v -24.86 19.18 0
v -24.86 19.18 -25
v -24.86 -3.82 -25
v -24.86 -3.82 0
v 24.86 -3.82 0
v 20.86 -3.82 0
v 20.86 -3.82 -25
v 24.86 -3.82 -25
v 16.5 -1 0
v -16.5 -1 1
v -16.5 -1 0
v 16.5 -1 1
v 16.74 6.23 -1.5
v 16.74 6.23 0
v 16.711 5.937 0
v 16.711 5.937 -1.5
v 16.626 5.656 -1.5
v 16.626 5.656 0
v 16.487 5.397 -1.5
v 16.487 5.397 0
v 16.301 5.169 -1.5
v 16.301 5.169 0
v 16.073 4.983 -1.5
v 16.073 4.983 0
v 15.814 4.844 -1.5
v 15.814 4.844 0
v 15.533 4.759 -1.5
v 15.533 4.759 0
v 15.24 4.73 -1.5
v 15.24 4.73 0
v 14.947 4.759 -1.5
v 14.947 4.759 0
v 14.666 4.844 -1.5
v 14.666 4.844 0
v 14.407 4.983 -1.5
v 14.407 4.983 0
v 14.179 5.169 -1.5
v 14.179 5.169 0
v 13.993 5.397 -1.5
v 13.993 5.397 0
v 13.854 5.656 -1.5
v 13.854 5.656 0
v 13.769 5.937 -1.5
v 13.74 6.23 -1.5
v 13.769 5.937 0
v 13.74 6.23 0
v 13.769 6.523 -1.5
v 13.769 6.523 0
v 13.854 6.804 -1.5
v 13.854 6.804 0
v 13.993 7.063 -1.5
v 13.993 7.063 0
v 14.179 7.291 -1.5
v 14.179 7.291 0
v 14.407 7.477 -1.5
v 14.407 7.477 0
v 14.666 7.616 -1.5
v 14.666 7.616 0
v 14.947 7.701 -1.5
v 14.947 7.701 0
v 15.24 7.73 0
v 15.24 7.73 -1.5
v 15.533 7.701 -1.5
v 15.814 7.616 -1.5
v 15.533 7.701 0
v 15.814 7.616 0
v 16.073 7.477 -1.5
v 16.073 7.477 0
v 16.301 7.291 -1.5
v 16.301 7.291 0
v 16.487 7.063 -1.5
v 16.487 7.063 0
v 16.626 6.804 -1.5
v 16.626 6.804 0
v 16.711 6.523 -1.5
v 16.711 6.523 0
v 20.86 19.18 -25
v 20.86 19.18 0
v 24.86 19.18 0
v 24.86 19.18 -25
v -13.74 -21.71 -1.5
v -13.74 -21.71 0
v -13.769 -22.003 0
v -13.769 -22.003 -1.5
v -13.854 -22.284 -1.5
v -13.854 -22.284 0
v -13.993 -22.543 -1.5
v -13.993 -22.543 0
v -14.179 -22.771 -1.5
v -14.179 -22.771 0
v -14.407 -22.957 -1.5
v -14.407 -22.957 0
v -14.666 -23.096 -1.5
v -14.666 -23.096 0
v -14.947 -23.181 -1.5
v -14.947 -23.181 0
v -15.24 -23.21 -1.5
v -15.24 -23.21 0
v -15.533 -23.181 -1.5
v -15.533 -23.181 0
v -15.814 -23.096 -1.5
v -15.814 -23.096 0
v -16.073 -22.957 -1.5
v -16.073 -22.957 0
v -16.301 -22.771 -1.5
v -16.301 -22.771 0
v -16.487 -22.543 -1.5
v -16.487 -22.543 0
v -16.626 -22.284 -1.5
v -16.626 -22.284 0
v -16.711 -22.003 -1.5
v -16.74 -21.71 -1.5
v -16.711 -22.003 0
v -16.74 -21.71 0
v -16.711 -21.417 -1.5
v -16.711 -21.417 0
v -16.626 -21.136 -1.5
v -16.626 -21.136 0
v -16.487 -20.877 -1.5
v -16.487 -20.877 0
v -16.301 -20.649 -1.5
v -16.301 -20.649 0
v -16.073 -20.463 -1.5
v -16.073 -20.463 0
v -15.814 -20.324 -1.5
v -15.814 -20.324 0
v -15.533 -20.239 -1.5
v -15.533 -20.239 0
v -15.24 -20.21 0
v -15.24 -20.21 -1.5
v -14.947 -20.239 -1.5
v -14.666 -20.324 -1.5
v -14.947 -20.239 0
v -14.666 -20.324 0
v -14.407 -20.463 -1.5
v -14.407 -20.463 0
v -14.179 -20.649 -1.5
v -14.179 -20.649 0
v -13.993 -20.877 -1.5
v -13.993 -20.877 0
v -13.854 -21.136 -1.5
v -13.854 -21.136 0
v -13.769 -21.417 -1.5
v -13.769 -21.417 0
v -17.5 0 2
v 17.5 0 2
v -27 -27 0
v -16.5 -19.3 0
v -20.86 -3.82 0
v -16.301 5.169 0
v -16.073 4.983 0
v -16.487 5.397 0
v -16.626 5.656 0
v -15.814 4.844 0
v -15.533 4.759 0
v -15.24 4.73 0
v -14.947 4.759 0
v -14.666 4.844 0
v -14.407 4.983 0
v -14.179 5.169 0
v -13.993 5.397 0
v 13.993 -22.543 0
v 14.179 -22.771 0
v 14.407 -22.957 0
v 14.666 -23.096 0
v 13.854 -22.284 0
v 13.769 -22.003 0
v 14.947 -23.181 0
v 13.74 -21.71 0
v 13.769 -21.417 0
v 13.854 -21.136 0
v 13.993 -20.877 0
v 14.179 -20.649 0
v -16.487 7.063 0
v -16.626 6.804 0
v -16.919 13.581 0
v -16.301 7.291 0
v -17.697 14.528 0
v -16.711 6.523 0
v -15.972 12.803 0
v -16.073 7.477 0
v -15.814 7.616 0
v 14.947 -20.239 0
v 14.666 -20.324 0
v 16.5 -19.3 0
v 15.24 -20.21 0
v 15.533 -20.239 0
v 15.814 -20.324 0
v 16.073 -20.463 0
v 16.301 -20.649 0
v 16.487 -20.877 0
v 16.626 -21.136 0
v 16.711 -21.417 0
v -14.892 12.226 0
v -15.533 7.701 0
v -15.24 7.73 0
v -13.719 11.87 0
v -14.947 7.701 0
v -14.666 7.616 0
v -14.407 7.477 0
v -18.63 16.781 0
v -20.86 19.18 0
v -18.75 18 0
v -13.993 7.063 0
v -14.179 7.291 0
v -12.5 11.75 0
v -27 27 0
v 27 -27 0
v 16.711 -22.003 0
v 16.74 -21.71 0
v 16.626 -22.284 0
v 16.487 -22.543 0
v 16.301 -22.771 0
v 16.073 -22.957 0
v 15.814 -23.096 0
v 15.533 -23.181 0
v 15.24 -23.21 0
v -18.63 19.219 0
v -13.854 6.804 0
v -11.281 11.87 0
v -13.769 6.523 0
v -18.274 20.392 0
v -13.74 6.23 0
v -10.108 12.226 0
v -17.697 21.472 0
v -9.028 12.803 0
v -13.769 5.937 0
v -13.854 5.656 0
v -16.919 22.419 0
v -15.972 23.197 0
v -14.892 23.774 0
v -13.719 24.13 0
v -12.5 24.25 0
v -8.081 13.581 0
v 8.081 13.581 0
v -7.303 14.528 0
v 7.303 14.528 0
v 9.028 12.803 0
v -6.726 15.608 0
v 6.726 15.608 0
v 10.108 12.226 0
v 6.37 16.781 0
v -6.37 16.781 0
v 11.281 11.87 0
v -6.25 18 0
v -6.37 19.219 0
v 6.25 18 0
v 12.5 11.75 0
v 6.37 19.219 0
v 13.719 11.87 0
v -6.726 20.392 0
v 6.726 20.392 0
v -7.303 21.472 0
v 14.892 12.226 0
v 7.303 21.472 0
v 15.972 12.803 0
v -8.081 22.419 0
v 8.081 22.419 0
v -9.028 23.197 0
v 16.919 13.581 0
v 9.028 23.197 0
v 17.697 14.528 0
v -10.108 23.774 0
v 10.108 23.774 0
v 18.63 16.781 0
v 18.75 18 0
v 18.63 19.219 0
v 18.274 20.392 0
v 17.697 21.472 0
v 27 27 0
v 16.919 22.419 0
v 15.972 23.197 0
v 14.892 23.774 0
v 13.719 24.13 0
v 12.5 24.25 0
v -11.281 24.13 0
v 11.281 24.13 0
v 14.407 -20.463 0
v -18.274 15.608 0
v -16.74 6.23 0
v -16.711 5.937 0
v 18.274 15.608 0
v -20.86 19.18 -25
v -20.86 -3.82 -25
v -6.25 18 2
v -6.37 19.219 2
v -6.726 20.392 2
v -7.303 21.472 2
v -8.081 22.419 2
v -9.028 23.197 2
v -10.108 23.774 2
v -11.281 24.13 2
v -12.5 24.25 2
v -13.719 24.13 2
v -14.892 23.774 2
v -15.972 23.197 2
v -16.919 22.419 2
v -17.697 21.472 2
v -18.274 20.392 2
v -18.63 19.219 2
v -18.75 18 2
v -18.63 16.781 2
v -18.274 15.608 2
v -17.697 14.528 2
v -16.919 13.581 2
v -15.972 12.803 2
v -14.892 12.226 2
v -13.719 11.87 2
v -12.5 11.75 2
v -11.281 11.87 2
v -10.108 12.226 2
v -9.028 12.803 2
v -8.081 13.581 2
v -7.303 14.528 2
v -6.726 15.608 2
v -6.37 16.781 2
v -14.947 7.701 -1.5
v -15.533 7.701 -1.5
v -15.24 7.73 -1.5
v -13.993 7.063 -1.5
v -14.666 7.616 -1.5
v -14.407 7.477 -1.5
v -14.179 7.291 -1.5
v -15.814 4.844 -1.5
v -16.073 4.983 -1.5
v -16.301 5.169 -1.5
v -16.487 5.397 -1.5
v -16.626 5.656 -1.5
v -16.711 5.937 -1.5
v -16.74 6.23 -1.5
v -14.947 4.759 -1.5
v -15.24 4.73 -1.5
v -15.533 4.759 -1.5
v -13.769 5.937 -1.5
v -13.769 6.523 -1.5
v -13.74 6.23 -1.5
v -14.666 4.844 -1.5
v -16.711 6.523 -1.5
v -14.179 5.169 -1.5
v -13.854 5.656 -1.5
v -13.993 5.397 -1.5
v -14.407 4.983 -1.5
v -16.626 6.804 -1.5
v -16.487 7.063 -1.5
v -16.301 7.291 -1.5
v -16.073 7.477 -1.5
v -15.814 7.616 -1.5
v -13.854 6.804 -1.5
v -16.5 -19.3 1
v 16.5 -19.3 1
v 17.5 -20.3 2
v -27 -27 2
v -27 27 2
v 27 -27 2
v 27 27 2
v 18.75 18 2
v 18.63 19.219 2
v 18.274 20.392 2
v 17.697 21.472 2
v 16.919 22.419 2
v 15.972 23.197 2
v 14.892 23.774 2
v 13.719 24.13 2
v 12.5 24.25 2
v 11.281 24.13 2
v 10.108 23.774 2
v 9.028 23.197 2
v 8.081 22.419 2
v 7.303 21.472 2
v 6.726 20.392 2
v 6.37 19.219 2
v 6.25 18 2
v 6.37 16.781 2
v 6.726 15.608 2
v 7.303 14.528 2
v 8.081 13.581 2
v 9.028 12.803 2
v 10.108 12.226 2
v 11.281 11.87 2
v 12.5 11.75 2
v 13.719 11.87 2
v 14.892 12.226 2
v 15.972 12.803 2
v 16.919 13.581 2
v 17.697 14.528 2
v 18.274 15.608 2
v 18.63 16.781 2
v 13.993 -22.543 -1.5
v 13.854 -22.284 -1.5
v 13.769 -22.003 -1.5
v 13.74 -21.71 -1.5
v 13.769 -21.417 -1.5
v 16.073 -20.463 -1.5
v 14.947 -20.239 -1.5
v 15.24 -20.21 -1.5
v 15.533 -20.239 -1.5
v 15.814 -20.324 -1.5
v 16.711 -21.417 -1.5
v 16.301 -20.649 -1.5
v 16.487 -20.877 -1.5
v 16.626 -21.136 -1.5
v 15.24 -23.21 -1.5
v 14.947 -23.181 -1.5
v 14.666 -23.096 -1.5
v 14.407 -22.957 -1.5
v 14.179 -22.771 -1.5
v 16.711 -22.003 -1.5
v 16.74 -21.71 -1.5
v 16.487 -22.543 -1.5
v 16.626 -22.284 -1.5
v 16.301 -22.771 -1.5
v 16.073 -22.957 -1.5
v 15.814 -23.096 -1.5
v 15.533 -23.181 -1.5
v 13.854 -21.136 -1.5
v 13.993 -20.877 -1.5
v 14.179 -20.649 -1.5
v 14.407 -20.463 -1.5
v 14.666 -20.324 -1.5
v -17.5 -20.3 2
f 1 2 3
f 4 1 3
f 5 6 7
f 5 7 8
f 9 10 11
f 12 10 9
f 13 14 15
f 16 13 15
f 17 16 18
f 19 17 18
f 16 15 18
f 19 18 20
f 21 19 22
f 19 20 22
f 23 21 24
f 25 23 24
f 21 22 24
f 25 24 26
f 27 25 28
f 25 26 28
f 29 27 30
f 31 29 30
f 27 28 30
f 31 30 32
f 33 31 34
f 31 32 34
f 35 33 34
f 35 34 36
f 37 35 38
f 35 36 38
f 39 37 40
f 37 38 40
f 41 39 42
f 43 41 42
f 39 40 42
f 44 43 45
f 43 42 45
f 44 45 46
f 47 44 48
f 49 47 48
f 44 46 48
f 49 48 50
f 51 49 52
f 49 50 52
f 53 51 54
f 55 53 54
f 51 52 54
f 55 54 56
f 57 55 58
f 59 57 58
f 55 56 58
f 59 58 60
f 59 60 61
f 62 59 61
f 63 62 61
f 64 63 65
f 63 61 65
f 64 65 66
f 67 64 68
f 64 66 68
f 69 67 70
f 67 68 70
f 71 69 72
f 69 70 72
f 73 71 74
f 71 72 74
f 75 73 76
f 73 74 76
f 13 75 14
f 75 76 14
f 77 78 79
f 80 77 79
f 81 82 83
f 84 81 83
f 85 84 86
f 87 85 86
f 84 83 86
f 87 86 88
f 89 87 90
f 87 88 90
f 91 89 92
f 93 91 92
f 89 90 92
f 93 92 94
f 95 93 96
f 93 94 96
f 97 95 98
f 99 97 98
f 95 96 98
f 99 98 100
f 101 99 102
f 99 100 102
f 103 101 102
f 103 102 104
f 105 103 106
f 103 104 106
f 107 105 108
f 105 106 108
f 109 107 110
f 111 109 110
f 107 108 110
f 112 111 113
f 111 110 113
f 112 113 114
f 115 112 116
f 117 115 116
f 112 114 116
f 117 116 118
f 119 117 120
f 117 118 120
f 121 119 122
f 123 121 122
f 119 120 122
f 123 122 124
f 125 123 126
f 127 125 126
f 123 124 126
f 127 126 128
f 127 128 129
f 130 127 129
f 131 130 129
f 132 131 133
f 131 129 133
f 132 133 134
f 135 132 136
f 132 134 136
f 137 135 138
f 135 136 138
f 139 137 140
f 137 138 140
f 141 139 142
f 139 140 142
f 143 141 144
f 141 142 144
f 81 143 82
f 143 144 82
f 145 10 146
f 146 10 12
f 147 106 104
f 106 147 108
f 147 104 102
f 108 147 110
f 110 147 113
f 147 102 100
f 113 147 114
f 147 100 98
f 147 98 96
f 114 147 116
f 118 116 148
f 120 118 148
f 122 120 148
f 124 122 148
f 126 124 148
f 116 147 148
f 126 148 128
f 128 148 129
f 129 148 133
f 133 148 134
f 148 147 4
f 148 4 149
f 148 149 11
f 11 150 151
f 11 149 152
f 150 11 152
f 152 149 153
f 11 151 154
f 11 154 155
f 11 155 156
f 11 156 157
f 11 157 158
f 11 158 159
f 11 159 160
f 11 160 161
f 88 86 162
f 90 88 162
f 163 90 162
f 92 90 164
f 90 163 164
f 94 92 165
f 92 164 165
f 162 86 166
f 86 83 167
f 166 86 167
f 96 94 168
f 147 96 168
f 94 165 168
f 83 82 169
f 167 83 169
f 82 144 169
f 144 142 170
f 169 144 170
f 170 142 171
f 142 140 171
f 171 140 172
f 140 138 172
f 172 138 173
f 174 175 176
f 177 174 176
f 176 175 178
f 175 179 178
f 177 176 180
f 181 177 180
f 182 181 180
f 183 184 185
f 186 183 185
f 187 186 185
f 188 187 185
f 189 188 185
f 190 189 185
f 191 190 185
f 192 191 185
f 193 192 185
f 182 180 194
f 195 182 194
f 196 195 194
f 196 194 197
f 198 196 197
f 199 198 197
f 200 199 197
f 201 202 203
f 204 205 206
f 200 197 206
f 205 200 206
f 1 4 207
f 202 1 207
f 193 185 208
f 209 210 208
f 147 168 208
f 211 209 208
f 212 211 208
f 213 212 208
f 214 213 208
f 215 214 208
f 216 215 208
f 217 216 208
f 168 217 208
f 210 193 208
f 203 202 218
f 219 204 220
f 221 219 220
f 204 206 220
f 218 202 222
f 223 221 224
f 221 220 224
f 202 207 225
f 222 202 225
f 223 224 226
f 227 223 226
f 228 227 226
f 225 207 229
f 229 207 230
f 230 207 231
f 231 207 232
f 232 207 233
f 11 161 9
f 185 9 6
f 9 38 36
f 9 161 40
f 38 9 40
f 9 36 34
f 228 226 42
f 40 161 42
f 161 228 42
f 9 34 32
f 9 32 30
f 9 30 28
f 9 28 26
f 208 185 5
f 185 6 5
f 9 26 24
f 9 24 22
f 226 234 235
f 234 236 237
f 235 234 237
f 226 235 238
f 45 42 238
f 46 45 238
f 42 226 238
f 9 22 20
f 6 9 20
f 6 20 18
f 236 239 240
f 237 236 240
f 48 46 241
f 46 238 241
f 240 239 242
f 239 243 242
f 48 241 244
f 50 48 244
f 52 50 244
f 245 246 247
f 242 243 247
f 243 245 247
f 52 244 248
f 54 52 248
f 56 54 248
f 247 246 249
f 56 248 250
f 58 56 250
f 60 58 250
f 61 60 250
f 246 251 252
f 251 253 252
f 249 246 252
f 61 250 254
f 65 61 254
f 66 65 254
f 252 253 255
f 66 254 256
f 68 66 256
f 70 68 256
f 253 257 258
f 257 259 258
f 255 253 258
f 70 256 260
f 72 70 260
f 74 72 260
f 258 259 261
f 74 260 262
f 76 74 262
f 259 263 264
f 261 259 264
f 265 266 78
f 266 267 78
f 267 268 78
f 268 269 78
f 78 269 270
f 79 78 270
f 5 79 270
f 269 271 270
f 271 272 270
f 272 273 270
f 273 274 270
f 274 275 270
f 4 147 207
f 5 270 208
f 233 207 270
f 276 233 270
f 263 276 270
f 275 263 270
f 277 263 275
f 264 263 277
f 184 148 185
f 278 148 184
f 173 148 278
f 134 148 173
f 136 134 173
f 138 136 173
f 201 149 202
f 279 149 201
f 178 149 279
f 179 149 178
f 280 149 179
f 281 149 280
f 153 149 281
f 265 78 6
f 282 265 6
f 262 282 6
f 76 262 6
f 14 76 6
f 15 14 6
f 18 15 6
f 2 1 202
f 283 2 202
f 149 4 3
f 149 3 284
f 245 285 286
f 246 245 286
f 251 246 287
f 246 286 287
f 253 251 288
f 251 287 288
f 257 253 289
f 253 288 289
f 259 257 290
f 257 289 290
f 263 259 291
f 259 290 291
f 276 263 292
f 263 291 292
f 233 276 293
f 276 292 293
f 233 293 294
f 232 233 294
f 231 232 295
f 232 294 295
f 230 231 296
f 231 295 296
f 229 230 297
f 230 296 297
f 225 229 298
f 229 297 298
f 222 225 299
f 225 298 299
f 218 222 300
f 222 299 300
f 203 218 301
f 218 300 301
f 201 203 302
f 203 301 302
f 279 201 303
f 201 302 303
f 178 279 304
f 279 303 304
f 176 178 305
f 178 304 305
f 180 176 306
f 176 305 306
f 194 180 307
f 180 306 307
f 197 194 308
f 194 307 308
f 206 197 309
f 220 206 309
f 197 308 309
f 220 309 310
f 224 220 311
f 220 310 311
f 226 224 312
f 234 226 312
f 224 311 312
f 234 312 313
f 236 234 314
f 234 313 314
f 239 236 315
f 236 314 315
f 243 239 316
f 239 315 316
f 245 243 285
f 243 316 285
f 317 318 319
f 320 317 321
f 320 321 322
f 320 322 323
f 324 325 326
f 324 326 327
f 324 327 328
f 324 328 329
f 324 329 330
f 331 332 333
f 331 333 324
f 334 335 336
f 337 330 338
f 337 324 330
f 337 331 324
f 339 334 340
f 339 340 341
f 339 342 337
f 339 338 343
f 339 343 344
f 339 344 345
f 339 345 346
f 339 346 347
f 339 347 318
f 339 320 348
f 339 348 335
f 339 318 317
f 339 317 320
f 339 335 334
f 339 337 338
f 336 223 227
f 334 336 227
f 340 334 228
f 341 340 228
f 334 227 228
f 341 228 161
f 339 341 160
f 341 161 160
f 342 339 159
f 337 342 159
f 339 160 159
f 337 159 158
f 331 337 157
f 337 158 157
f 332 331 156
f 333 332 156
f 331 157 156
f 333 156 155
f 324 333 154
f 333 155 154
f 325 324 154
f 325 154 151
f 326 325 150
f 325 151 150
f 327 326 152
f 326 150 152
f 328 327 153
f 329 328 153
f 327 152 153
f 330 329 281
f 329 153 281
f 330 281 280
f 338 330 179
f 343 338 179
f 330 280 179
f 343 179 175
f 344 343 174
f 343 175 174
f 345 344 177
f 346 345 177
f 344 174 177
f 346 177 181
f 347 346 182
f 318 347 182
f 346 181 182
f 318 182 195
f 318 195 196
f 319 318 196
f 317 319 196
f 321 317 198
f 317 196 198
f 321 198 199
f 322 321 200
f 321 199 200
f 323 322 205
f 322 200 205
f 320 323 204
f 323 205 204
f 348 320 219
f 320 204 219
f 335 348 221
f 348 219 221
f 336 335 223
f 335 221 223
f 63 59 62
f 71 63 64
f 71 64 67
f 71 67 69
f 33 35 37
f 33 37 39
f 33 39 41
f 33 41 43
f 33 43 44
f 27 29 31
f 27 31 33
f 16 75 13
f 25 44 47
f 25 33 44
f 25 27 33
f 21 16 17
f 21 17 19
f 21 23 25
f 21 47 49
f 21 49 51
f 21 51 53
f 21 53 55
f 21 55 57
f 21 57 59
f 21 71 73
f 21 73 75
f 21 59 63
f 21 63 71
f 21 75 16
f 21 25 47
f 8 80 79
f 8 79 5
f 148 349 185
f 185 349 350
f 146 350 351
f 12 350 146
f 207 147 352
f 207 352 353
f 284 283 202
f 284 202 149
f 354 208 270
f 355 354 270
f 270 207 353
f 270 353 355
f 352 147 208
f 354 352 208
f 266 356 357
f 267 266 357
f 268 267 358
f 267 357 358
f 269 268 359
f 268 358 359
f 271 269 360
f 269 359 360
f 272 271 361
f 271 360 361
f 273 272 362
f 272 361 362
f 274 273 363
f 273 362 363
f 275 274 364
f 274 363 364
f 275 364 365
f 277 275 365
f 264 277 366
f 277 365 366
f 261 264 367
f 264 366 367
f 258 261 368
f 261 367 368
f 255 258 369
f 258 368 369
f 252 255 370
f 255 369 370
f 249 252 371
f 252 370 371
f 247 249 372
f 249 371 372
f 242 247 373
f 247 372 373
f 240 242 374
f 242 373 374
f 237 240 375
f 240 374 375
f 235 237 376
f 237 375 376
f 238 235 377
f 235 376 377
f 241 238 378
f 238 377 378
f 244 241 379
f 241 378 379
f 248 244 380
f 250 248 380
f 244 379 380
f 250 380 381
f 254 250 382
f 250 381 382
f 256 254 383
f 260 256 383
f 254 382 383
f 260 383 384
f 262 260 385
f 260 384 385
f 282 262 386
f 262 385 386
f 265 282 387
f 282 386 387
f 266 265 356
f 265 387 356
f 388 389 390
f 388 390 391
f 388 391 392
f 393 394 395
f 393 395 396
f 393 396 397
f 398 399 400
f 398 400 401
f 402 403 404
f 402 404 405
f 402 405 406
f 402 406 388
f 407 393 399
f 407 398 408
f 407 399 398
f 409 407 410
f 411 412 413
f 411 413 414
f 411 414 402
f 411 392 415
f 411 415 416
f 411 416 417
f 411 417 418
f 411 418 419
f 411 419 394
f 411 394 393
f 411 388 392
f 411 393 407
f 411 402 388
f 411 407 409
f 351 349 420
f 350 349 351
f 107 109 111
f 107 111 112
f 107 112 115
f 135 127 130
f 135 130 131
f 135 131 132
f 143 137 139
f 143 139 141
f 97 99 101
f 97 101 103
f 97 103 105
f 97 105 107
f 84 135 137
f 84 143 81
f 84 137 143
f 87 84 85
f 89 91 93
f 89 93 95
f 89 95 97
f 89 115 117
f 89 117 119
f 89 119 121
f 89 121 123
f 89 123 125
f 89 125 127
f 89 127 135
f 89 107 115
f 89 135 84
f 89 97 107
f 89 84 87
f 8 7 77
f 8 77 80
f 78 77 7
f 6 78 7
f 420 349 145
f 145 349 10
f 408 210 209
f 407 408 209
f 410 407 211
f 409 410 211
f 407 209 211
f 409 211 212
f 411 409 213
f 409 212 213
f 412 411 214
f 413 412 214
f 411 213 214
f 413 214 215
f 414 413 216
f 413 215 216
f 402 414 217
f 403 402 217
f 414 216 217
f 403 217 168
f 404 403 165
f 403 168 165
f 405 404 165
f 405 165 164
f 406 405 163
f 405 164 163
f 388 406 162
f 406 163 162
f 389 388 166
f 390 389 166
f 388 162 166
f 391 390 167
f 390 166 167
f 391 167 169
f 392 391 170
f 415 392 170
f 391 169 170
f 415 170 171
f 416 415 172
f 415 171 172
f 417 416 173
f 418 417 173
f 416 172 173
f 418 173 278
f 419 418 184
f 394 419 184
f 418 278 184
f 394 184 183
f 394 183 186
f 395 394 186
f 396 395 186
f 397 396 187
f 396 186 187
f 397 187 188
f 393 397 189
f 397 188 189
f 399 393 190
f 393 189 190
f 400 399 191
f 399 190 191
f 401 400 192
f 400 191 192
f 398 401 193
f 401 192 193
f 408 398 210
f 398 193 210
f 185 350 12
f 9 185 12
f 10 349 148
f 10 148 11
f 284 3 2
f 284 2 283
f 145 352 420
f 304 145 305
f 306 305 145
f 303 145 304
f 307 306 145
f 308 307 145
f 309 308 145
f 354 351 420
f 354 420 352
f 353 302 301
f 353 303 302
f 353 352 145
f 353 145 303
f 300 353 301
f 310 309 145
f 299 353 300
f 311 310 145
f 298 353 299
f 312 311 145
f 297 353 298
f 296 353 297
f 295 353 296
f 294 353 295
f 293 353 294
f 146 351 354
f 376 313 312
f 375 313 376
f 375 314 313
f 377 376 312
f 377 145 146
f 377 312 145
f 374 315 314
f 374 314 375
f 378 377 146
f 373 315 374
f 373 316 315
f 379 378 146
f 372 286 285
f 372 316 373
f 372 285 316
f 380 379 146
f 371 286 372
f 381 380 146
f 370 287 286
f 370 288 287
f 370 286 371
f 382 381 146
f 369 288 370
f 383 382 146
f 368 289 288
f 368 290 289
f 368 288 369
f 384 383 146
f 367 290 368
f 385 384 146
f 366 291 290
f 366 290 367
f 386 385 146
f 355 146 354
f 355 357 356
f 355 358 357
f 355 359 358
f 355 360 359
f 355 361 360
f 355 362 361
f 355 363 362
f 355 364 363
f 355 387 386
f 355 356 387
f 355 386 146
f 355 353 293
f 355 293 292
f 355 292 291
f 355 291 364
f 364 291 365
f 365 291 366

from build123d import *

# Parameters (mm, degrees)
SKETCH009_W     = 54
SKETCH009_H     = 54
PAD002_DEPTH    = 2
SKETCH008_R     = 6.25
SKETCH008_W     = 33
SKETCH008_H     = 18.3
POCKET006_DEPTH = 2
SKETCH013_R     = 1.5
PAD004_DEPTH    = 1.5
SKETCH014_W     = 4
SKETCH014_H     = 23
PAD005_DEPTH    = 25
CHAMFER001_SIZE = 1


with BuildPart() as part:
    # Sketch009 → Pad002 (new body)
    with BuildSketch(Plane.XY):
        Rectangle(SKETCH009_W, SKETCH009_H)
    extrude(amount=PAD002_DEPTH)

    # Sketch008 (on Face6 of Pad002) → Pocket006 (cut)
    with BuildSketch(Plane.XY.offset(2)):
        with Locations((-12.5, 18)):
            Circle(SKETCH008_R)
        with Locations((12.5, 18)):
            Circle(SKETCH008_R)
        with Locations((0, -10.15)):
            Rectangle(SKETCH008_W, SKETCH008_H)
    extrude(amount=-POCKET006_DEPTH, mode=Mode.SUBTRACT)

    # Sketch013 (on Face4 of Pocket006) → Pad004 (join)
    with BuildSketch(Plane(origin=(0, 0, 0), x_dir=(1, 0, 0), z_dir=(0, 0, -1))):
        with Locations((-15.24, 21.71)):
            Circle(SKETCH013_R)
        with Locations((15.24, 21.71)):
            Circle(SKETCH013_R)
        with Locations((15.24, -6.23)):
            Circle(SKETCH013_R)
        with Locations((-15.24, -6.23)):
            Circle(SKETCH013_R)
    extrude(amount=PAD004_DEPTH)

    # Sketch014 (on Face4 of Pad004) → Pad005 (join)
    with BuildSketch(Plane(origin=(0, 0, 0), x_dir=(1, 0, 0), z_dir=(0, 0, -1))):
        with Locations((-22.86, -7.68)):
            Rectangle(SKETCH014_W, SKETCH014_H)
        with Locations((22.86, -7.68)):
            Rectangle(SKETCH014_W, SKETCH014_H)
    extrude(amount=PAD005_DEPTH)

    # Chamfer001
    chamfer001_edges = [part.edges().sort_by_distance(p)[0] for p in [
        (0, -19.3, 2),
        (-16.5, -10.15, 2),
        (0, -1, 2),
        (16.5, -10.15, 2),
    ]]
    chamfer(chamfer001_edges, length=CHAMFER001_SIZE)


solid = part.part
